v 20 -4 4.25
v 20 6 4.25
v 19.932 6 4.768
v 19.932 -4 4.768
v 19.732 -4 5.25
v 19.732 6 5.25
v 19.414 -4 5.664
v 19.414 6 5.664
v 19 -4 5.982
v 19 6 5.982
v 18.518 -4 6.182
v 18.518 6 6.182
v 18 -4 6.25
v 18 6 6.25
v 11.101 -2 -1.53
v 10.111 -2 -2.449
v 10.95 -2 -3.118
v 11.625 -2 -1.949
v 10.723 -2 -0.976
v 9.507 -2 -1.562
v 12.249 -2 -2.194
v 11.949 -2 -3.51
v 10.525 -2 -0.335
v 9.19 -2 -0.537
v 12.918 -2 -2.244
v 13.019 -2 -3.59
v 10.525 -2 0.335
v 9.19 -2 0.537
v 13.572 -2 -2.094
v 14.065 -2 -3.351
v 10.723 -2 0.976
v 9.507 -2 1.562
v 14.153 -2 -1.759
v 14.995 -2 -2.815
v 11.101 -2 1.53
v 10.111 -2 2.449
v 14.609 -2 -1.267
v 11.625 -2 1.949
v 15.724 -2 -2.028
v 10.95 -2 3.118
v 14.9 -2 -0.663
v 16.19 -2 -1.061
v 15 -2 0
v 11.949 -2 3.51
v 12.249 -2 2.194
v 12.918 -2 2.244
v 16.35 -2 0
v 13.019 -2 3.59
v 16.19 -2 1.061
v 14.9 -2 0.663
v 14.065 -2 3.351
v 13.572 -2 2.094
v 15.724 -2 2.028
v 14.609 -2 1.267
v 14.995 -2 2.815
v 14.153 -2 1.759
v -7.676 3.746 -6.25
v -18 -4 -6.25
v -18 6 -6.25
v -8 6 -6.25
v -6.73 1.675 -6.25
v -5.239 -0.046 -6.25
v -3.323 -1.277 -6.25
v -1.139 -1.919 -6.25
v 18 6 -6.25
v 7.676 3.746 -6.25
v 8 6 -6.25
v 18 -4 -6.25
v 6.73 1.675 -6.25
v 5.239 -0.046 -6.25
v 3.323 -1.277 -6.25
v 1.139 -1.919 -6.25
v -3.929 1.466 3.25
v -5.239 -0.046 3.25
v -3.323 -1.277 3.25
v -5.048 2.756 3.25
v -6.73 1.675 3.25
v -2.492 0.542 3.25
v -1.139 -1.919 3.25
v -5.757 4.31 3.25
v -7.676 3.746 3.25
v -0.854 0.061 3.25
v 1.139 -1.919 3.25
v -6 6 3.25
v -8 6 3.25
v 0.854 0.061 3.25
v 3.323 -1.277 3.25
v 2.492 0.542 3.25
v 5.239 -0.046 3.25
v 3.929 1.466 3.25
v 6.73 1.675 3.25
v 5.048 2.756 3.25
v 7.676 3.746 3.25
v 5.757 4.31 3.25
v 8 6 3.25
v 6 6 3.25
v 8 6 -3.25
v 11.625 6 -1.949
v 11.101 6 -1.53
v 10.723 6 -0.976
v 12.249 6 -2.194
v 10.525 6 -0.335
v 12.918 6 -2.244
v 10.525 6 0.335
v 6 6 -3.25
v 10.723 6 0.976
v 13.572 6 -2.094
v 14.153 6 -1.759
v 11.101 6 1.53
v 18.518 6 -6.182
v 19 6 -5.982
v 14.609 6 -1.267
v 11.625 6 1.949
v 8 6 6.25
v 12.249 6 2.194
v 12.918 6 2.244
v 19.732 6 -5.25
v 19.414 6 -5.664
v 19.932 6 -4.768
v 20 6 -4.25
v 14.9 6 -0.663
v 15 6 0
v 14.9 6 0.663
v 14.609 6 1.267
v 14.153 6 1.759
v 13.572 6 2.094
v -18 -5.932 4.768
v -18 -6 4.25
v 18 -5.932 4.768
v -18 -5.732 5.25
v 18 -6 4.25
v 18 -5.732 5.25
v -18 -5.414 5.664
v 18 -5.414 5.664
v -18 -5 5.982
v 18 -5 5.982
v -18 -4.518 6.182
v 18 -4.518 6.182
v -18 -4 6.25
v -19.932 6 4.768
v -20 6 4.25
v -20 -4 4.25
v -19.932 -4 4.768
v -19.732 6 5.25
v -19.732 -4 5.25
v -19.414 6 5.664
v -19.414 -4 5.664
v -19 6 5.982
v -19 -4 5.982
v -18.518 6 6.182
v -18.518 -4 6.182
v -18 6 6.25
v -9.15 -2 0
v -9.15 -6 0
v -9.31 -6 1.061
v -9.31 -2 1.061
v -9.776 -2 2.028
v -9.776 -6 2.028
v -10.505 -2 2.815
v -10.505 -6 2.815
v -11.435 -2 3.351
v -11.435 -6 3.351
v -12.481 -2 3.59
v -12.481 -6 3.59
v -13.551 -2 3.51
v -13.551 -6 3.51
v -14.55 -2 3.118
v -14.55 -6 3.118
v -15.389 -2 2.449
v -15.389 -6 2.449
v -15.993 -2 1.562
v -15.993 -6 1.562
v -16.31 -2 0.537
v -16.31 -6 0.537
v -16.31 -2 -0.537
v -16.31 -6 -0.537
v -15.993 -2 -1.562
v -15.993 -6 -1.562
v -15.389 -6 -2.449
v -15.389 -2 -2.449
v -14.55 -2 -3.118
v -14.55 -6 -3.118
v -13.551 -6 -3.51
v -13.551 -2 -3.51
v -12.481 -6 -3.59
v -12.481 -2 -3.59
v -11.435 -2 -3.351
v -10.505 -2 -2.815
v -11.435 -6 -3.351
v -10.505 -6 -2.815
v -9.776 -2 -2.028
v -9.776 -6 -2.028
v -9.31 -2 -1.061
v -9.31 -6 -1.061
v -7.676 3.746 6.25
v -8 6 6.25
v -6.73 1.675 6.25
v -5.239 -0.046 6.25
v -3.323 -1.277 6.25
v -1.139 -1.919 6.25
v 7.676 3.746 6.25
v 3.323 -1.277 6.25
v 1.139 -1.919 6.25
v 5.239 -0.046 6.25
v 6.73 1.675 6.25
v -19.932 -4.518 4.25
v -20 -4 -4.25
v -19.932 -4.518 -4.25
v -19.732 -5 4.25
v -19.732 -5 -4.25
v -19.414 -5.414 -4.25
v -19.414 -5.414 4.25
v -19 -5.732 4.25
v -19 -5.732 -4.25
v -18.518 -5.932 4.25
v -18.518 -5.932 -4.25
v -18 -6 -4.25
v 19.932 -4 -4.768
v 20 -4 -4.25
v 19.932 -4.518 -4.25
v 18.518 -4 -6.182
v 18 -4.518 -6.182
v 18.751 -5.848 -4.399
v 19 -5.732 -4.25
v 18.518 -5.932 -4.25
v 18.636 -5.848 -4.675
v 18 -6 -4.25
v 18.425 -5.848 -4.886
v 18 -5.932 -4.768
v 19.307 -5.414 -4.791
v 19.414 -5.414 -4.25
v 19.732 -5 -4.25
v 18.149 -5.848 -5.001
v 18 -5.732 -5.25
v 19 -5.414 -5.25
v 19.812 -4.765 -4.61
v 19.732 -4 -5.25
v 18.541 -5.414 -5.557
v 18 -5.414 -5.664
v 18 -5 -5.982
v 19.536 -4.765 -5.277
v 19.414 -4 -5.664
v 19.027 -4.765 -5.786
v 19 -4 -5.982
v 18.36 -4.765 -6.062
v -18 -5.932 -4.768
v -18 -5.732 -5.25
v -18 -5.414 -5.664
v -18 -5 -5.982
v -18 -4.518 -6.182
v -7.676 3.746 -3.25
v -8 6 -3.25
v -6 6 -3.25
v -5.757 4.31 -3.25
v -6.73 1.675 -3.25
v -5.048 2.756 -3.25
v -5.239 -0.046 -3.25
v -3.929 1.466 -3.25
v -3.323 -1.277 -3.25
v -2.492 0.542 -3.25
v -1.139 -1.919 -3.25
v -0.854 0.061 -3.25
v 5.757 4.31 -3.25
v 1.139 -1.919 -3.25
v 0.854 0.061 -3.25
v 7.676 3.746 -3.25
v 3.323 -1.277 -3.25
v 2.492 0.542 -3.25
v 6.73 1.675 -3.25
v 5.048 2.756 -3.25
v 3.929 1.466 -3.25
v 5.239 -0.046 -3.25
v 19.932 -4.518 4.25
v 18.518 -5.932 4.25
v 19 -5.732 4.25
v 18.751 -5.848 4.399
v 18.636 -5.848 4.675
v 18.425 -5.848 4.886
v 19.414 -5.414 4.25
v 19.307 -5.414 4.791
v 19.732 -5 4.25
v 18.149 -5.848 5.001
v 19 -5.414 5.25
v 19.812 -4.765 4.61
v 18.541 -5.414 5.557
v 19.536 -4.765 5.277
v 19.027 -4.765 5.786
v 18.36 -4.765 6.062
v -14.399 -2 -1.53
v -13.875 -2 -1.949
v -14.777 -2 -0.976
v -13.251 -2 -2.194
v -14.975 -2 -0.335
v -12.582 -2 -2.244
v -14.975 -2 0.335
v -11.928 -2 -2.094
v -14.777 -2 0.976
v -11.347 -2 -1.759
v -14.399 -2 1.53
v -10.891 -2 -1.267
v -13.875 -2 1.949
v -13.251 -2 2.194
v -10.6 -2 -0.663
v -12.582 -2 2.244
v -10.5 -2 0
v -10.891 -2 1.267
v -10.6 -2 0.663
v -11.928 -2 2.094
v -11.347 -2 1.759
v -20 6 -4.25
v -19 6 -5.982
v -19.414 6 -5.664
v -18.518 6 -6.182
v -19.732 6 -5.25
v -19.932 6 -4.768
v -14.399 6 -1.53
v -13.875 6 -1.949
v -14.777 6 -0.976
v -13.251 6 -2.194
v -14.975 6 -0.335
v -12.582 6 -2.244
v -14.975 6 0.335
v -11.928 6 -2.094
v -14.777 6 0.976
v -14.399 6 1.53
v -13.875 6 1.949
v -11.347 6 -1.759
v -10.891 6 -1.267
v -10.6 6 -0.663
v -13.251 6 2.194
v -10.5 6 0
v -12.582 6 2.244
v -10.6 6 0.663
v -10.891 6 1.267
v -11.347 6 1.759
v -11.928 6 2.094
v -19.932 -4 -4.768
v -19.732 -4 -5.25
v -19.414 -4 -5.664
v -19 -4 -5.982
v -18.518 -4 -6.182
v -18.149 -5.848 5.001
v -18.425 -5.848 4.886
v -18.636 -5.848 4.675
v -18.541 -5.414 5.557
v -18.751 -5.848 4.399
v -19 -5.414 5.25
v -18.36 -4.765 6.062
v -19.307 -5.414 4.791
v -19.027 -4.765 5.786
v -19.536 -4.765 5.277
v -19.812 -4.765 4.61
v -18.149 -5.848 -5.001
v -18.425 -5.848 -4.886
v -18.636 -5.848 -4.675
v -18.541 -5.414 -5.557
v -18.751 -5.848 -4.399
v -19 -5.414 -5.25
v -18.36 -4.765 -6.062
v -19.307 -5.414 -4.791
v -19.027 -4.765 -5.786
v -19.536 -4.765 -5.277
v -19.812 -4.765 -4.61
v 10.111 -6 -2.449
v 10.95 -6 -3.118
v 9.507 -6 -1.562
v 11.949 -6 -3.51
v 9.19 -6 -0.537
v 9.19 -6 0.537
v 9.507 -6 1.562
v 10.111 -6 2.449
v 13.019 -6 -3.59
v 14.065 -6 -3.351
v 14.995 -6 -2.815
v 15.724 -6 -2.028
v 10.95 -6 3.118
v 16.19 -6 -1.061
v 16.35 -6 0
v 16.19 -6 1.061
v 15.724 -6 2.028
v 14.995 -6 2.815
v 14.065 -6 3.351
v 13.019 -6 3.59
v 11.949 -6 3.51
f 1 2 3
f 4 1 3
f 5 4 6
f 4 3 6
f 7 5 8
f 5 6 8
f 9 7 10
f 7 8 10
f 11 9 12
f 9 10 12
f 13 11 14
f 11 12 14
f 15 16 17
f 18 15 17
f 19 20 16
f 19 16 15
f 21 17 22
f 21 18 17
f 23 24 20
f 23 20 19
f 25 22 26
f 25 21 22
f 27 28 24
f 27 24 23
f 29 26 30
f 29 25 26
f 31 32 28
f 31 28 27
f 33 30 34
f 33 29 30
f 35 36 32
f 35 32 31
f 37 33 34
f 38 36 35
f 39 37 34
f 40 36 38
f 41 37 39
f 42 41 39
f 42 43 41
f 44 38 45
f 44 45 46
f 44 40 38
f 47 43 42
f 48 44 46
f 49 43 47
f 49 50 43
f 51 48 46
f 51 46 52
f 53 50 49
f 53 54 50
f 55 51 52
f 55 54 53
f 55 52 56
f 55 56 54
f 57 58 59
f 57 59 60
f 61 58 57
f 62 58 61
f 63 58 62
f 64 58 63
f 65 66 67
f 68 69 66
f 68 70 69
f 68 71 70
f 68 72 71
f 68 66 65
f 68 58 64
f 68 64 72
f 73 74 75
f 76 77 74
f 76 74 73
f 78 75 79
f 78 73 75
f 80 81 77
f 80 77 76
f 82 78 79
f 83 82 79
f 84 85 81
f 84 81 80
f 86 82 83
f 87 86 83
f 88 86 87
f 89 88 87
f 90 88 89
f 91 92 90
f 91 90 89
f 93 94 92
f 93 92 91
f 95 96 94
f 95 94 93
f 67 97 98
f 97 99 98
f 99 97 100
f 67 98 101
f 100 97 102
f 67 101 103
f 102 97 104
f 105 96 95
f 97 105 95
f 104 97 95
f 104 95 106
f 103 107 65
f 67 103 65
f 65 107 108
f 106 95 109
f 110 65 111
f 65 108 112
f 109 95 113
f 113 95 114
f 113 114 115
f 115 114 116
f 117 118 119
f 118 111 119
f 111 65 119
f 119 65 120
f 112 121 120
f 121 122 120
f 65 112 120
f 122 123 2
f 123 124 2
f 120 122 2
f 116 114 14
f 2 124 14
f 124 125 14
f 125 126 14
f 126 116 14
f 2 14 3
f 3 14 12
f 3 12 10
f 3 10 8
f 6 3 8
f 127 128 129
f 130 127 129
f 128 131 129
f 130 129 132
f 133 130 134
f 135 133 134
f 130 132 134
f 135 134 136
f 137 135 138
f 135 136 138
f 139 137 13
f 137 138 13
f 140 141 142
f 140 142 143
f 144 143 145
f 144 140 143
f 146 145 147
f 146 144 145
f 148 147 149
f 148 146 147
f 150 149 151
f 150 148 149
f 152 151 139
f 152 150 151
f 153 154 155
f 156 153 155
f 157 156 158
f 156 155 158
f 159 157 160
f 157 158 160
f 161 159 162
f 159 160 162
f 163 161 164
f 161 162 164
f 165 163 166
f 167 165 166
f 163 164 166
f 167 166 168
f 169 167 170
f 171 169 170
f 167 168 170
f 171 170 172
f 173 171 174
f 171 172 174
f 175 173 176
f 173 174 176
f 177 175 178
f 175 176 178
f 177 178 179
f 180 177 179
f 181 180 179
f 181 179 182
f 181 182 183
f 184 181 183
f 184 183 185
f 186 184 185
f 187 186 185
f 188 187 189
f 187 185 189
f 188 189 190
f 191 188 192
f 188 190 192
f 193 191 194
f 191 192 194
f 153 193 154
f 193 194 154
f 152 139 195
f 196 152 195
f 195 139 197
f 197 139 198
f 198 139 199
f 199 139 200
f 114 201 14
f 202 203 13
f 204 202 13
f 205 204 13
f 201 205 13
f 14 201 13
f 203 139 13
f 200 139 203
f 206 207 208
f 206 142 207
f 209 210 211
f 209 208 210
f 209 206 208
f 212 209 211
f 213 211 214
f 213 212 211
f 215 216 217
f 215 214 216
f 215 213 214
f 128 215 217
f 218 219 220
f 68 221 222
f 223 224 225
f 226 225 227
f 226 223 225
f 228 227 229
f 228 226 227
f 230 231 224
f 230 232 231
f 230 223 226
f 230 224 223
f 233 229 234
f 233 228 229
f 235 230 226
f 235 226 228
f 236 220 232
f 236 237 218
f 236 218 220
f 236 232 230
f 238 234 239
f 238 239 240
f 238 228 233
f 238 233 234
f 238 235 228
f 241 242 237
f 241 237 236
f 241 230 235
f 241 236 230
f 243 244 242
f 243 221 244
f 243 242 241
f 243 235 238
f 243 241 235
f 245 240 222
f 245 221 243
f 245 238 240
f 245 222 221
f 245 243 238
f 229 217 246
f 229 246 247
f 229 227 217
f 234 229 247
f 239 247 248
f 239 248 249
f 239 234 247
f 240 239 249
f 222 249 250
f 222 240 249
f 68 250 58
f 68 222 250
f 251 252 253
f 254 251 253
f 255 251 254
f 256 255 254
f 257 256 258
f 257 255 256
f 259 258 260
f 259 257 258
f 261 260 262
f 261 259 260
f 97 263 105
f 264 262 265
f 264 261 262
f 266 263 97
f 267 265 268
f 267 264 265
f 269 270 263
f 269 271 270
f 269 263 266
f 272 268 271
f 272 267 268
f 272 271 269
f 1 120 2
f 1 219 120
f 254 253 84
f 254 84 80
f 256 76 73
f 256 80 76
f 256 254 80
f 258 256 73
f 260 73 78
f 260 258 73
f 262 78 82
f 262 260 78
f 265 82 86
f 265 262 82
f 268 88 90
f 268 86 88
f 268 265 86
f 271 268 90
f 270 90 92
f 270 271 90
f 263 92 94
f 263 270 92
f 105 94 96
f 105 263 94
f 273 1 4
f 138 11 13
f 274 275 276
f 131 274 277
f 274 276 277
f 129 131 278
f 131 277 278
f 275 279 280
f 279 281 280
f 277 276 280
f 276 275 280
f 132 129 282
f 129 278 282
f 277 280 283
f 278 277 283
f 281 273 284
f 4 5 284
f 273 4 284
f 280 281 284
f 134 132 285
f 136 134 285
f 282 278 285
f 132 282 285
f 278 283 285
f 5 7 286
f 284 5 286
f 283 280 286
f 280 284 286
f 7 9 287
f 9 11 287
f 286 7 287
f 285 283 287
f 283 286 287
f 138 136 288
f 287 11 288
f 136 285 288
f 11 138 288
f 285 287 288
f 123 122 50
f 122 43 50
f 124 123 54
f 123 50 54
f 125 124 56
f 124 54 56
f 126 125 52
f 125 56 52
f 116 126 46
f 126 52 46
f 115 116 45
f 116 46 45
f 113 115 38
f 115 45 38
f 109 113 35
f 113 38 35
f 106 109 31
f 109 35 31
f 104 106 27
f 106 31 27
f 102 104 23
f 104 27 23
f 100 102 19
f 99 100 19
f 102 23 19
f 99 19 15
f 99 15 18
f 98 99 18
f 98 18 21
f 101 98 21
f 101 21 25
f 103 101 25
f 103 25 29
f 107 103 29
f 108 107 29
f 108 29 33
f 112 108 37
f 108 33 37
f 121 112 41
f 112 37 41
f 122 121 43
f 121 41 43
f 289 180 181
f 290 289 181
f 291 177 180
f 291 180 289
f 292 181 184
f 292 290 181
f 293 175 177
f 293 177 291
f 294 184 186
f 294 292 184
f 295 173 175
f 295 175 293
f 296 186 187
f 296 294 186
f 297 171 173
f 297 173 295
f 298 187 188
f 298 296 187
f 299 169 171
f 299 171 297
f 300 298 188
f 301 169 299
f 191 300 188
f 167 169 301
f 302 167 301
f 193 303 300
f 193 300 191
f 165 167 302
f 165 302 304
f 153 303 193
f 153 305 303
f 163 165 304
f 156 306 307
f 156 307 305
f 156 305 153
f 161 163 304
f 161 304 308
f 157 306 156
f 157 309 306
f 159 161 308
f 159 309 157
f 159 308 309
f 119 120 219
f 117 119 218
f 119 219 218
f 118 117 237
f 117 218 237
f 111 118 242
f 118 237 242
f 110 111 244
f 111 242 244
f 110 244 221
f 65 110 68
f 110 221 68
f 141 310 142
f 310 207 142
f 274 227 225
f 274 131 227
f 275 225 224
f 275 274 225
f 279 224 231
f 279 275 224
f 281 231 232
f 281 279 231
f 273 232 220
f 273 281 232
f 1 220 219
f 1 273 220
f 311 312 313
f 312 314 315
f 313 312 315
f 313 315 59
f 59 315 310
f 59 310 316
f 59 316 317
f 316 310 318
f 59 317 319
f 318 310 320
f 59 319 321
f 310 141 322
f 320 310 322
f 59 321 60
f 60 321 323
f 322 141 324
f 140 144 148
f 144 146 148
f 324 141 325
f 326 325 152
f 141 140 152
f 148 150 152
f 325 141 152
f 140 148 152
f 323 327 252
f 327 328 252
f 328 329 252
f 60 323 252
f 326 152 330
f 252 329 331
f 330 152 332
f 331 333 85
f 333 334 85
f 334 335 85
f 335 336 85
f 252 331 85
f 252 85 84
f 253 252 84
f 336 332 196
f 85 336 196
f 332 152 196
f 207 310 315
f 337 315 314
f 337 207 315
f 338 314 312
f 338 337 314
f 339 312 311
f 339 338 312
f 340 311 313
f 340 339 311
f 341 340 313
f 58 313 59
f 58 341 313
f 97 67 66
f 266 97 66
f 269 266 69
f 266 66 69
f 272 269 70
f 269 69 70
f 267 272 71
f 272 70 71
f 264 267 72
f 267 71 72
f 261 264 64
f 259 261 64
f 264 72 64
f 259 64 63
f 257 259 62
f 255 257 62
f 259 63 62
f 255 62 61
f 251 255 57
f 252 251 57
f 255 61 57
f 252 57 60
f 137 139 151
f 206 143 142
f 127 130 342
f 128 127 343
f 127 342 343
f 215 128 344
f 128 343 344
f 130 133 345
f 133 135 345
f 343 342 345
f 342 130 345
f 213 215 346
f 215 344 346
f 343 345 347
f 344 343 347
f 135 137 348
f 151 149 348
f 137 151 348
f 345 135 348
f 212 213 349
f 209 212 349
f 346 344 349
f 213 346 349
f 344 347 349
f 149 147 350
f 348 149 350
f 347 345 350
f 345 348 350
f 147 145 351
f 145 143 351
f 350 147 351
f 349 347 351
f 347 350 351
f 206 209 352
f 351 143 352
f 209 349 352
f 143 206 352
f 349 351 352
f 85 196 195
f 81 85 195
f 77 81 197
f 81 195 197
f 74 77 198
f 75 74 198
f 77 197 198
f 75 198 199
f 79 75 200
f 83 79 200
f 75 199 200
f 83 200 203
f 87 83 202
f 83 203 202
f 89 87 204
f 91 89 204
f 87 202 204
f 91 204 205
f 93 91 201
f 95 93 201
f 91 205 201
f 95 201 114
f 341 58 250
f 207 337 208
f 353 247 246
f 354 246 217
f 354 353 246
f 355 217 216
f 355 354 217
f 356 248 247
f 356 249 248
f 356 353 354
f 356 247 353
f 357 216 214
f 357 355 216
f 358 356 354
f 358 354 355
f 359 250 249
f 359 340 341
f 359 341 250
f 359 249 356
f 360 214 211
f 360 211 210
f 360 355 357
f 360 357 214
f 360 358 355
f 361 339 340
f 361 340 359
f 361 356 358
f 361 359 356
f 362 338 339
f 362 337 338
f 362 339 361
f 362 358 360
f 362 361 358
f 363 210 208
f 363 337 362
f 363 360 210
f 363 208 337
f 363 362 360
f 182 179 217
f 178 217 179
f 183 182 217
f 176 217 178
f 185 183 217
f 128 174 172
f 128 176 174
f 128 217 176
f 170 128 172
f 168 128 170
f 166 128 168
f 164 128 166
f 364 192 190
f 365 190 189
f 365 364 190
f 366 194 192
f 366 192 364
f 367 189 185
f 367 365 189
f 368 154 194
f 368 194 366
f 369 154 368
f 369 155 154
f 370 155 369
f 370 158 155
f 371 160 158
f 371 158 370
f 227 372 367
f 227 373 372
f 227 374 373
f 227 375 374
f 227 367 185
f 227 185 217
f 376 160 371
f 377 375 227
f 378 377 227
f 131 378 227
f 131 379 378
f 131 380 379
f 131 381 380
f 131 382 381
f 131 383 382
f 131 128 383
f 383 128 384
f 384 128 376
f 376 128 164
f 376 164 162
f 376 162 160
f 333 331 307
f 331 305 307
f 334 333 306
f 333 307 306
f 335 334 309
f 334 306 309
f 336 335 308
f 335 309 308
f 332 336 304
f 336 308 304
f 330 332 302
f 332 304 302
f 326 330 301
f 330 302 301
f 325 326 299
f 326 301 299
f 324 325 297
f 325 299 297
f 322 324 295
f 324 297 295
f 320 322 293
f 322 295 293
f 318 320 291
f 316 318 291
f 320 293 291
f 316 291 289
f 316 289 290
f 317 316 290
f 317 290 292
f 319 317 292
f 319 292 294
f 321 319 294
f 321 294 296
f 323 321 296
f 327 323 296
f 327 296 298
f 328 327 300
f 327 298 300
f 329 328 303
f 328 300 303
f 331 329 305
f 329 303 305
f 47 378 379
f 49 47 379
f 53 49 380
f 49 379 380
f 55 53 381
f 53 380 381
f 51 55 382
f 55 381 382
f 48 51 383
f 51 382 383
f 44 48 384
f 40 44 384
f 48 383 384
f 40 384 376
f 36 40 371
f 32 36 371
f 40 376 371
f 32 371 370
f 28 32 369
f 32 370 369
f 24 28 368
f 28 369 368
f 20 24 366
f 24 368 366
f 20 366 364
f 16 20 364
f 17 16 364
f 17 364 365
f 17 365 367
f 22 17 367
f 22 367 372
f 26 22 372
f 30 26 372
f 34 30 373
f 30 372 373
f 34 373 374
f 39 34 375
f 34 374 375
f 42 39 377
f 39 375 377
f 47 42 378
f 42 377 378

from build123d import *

# Parameters (mm, degrees)
F0_W          = 40
F0_H          = 12.5
F0_R          = 2.25
F1_DEPTH      = 6
F1_DEPTH_BACK = 6
F2_R          = 3.6
F3_DEPTH      = 4
F4_R          = 2
F6_DEPTH      = 6.25
F6_DEPTH_BACK = 6.25
F7_R          = 8
F8_DEPTH      = 3
F9_R          = 8
F10_DEPTH     = 3


with BuildPart() as f1:
    # F0 (on Front) → F1 (new body, two sides)
    with BuildSketch(Plane.XZ) as f1_sk:
        Rectangle(F0_W, F0_H)
        with Locations((-12.75, 0)):
            Circle(F0_R, mode=Mode.SUBTRACT)
        with Locations((12.75, 0)):
            Circle(F0_R, mode=Mode.SUBTRACT)
    extrude(amount=F1_DEPTH)
    extrude(f1_sk.sketch, amount=-F1_DEPTH_BACK)

    # F2 (on face) → F3 (cut)
    with BuildSketch(Plane.XZ.offset(6)):
        with Locations((-12.75, 0)):
            Circle(F2_R)
        with Locations((12.75, 0)):
            Circle(F2_R)
    extrude(amount=-F3_DEPTH, mode=Mode.SUBTRACT)

    # F4
    f4_edges = [f1.edges().sort_by_distance(p)[0] for p in [
        (-20, 0, 6.25),
        (-20, 0, -6.25),
        (20, 0, 6.25),
        (20, 0, -6.25),
        (20, -6, 0),
        (0, -6, 6.25),
        (0, -6, -6.25),
        (-20, -6, 0),
    ]]
    fillet(f4_edges, radius=F4_R)

    # F5 (on Top) → F6 (cut, two sides)
    with BuildSketch(Plane.XY) as f6_sk:
        with BuildLine():
            Line((6, 6), (-6, 6))
            ThreePointArc((-6, 6), (0, 0), (6, 6))
        make_face()
    extrude(amount=-F6_DEPTH, mode=Mode.SUBTRACT)
    extrude(f6_sk.sketch, amount=F6_DEPTH_BACK, mode=Mode.SUBTRACT)

    # F7 (on face) → F8 (cut)
    with BuildSketch(Plane.XY.offset(6.25)):
        with Locations((0, 6)):
            Circle(F7_R)
    extrude(amount=-F8_DEPTH, mode=Mode.SUBTRACT)

    # F9 (on face) → F10 (cut)
    with BuildSketch(Plane(origin=(0, 0, -6.25), x_dir=(1, 0, 0), z_dir=(0, 0, -1))):
        with Locations((0, -6)):
            Circle(F9_R)
    extrude(amount=-F10_DEPTH, mode=Mode.SUBTRACT)


solid = f1.part
